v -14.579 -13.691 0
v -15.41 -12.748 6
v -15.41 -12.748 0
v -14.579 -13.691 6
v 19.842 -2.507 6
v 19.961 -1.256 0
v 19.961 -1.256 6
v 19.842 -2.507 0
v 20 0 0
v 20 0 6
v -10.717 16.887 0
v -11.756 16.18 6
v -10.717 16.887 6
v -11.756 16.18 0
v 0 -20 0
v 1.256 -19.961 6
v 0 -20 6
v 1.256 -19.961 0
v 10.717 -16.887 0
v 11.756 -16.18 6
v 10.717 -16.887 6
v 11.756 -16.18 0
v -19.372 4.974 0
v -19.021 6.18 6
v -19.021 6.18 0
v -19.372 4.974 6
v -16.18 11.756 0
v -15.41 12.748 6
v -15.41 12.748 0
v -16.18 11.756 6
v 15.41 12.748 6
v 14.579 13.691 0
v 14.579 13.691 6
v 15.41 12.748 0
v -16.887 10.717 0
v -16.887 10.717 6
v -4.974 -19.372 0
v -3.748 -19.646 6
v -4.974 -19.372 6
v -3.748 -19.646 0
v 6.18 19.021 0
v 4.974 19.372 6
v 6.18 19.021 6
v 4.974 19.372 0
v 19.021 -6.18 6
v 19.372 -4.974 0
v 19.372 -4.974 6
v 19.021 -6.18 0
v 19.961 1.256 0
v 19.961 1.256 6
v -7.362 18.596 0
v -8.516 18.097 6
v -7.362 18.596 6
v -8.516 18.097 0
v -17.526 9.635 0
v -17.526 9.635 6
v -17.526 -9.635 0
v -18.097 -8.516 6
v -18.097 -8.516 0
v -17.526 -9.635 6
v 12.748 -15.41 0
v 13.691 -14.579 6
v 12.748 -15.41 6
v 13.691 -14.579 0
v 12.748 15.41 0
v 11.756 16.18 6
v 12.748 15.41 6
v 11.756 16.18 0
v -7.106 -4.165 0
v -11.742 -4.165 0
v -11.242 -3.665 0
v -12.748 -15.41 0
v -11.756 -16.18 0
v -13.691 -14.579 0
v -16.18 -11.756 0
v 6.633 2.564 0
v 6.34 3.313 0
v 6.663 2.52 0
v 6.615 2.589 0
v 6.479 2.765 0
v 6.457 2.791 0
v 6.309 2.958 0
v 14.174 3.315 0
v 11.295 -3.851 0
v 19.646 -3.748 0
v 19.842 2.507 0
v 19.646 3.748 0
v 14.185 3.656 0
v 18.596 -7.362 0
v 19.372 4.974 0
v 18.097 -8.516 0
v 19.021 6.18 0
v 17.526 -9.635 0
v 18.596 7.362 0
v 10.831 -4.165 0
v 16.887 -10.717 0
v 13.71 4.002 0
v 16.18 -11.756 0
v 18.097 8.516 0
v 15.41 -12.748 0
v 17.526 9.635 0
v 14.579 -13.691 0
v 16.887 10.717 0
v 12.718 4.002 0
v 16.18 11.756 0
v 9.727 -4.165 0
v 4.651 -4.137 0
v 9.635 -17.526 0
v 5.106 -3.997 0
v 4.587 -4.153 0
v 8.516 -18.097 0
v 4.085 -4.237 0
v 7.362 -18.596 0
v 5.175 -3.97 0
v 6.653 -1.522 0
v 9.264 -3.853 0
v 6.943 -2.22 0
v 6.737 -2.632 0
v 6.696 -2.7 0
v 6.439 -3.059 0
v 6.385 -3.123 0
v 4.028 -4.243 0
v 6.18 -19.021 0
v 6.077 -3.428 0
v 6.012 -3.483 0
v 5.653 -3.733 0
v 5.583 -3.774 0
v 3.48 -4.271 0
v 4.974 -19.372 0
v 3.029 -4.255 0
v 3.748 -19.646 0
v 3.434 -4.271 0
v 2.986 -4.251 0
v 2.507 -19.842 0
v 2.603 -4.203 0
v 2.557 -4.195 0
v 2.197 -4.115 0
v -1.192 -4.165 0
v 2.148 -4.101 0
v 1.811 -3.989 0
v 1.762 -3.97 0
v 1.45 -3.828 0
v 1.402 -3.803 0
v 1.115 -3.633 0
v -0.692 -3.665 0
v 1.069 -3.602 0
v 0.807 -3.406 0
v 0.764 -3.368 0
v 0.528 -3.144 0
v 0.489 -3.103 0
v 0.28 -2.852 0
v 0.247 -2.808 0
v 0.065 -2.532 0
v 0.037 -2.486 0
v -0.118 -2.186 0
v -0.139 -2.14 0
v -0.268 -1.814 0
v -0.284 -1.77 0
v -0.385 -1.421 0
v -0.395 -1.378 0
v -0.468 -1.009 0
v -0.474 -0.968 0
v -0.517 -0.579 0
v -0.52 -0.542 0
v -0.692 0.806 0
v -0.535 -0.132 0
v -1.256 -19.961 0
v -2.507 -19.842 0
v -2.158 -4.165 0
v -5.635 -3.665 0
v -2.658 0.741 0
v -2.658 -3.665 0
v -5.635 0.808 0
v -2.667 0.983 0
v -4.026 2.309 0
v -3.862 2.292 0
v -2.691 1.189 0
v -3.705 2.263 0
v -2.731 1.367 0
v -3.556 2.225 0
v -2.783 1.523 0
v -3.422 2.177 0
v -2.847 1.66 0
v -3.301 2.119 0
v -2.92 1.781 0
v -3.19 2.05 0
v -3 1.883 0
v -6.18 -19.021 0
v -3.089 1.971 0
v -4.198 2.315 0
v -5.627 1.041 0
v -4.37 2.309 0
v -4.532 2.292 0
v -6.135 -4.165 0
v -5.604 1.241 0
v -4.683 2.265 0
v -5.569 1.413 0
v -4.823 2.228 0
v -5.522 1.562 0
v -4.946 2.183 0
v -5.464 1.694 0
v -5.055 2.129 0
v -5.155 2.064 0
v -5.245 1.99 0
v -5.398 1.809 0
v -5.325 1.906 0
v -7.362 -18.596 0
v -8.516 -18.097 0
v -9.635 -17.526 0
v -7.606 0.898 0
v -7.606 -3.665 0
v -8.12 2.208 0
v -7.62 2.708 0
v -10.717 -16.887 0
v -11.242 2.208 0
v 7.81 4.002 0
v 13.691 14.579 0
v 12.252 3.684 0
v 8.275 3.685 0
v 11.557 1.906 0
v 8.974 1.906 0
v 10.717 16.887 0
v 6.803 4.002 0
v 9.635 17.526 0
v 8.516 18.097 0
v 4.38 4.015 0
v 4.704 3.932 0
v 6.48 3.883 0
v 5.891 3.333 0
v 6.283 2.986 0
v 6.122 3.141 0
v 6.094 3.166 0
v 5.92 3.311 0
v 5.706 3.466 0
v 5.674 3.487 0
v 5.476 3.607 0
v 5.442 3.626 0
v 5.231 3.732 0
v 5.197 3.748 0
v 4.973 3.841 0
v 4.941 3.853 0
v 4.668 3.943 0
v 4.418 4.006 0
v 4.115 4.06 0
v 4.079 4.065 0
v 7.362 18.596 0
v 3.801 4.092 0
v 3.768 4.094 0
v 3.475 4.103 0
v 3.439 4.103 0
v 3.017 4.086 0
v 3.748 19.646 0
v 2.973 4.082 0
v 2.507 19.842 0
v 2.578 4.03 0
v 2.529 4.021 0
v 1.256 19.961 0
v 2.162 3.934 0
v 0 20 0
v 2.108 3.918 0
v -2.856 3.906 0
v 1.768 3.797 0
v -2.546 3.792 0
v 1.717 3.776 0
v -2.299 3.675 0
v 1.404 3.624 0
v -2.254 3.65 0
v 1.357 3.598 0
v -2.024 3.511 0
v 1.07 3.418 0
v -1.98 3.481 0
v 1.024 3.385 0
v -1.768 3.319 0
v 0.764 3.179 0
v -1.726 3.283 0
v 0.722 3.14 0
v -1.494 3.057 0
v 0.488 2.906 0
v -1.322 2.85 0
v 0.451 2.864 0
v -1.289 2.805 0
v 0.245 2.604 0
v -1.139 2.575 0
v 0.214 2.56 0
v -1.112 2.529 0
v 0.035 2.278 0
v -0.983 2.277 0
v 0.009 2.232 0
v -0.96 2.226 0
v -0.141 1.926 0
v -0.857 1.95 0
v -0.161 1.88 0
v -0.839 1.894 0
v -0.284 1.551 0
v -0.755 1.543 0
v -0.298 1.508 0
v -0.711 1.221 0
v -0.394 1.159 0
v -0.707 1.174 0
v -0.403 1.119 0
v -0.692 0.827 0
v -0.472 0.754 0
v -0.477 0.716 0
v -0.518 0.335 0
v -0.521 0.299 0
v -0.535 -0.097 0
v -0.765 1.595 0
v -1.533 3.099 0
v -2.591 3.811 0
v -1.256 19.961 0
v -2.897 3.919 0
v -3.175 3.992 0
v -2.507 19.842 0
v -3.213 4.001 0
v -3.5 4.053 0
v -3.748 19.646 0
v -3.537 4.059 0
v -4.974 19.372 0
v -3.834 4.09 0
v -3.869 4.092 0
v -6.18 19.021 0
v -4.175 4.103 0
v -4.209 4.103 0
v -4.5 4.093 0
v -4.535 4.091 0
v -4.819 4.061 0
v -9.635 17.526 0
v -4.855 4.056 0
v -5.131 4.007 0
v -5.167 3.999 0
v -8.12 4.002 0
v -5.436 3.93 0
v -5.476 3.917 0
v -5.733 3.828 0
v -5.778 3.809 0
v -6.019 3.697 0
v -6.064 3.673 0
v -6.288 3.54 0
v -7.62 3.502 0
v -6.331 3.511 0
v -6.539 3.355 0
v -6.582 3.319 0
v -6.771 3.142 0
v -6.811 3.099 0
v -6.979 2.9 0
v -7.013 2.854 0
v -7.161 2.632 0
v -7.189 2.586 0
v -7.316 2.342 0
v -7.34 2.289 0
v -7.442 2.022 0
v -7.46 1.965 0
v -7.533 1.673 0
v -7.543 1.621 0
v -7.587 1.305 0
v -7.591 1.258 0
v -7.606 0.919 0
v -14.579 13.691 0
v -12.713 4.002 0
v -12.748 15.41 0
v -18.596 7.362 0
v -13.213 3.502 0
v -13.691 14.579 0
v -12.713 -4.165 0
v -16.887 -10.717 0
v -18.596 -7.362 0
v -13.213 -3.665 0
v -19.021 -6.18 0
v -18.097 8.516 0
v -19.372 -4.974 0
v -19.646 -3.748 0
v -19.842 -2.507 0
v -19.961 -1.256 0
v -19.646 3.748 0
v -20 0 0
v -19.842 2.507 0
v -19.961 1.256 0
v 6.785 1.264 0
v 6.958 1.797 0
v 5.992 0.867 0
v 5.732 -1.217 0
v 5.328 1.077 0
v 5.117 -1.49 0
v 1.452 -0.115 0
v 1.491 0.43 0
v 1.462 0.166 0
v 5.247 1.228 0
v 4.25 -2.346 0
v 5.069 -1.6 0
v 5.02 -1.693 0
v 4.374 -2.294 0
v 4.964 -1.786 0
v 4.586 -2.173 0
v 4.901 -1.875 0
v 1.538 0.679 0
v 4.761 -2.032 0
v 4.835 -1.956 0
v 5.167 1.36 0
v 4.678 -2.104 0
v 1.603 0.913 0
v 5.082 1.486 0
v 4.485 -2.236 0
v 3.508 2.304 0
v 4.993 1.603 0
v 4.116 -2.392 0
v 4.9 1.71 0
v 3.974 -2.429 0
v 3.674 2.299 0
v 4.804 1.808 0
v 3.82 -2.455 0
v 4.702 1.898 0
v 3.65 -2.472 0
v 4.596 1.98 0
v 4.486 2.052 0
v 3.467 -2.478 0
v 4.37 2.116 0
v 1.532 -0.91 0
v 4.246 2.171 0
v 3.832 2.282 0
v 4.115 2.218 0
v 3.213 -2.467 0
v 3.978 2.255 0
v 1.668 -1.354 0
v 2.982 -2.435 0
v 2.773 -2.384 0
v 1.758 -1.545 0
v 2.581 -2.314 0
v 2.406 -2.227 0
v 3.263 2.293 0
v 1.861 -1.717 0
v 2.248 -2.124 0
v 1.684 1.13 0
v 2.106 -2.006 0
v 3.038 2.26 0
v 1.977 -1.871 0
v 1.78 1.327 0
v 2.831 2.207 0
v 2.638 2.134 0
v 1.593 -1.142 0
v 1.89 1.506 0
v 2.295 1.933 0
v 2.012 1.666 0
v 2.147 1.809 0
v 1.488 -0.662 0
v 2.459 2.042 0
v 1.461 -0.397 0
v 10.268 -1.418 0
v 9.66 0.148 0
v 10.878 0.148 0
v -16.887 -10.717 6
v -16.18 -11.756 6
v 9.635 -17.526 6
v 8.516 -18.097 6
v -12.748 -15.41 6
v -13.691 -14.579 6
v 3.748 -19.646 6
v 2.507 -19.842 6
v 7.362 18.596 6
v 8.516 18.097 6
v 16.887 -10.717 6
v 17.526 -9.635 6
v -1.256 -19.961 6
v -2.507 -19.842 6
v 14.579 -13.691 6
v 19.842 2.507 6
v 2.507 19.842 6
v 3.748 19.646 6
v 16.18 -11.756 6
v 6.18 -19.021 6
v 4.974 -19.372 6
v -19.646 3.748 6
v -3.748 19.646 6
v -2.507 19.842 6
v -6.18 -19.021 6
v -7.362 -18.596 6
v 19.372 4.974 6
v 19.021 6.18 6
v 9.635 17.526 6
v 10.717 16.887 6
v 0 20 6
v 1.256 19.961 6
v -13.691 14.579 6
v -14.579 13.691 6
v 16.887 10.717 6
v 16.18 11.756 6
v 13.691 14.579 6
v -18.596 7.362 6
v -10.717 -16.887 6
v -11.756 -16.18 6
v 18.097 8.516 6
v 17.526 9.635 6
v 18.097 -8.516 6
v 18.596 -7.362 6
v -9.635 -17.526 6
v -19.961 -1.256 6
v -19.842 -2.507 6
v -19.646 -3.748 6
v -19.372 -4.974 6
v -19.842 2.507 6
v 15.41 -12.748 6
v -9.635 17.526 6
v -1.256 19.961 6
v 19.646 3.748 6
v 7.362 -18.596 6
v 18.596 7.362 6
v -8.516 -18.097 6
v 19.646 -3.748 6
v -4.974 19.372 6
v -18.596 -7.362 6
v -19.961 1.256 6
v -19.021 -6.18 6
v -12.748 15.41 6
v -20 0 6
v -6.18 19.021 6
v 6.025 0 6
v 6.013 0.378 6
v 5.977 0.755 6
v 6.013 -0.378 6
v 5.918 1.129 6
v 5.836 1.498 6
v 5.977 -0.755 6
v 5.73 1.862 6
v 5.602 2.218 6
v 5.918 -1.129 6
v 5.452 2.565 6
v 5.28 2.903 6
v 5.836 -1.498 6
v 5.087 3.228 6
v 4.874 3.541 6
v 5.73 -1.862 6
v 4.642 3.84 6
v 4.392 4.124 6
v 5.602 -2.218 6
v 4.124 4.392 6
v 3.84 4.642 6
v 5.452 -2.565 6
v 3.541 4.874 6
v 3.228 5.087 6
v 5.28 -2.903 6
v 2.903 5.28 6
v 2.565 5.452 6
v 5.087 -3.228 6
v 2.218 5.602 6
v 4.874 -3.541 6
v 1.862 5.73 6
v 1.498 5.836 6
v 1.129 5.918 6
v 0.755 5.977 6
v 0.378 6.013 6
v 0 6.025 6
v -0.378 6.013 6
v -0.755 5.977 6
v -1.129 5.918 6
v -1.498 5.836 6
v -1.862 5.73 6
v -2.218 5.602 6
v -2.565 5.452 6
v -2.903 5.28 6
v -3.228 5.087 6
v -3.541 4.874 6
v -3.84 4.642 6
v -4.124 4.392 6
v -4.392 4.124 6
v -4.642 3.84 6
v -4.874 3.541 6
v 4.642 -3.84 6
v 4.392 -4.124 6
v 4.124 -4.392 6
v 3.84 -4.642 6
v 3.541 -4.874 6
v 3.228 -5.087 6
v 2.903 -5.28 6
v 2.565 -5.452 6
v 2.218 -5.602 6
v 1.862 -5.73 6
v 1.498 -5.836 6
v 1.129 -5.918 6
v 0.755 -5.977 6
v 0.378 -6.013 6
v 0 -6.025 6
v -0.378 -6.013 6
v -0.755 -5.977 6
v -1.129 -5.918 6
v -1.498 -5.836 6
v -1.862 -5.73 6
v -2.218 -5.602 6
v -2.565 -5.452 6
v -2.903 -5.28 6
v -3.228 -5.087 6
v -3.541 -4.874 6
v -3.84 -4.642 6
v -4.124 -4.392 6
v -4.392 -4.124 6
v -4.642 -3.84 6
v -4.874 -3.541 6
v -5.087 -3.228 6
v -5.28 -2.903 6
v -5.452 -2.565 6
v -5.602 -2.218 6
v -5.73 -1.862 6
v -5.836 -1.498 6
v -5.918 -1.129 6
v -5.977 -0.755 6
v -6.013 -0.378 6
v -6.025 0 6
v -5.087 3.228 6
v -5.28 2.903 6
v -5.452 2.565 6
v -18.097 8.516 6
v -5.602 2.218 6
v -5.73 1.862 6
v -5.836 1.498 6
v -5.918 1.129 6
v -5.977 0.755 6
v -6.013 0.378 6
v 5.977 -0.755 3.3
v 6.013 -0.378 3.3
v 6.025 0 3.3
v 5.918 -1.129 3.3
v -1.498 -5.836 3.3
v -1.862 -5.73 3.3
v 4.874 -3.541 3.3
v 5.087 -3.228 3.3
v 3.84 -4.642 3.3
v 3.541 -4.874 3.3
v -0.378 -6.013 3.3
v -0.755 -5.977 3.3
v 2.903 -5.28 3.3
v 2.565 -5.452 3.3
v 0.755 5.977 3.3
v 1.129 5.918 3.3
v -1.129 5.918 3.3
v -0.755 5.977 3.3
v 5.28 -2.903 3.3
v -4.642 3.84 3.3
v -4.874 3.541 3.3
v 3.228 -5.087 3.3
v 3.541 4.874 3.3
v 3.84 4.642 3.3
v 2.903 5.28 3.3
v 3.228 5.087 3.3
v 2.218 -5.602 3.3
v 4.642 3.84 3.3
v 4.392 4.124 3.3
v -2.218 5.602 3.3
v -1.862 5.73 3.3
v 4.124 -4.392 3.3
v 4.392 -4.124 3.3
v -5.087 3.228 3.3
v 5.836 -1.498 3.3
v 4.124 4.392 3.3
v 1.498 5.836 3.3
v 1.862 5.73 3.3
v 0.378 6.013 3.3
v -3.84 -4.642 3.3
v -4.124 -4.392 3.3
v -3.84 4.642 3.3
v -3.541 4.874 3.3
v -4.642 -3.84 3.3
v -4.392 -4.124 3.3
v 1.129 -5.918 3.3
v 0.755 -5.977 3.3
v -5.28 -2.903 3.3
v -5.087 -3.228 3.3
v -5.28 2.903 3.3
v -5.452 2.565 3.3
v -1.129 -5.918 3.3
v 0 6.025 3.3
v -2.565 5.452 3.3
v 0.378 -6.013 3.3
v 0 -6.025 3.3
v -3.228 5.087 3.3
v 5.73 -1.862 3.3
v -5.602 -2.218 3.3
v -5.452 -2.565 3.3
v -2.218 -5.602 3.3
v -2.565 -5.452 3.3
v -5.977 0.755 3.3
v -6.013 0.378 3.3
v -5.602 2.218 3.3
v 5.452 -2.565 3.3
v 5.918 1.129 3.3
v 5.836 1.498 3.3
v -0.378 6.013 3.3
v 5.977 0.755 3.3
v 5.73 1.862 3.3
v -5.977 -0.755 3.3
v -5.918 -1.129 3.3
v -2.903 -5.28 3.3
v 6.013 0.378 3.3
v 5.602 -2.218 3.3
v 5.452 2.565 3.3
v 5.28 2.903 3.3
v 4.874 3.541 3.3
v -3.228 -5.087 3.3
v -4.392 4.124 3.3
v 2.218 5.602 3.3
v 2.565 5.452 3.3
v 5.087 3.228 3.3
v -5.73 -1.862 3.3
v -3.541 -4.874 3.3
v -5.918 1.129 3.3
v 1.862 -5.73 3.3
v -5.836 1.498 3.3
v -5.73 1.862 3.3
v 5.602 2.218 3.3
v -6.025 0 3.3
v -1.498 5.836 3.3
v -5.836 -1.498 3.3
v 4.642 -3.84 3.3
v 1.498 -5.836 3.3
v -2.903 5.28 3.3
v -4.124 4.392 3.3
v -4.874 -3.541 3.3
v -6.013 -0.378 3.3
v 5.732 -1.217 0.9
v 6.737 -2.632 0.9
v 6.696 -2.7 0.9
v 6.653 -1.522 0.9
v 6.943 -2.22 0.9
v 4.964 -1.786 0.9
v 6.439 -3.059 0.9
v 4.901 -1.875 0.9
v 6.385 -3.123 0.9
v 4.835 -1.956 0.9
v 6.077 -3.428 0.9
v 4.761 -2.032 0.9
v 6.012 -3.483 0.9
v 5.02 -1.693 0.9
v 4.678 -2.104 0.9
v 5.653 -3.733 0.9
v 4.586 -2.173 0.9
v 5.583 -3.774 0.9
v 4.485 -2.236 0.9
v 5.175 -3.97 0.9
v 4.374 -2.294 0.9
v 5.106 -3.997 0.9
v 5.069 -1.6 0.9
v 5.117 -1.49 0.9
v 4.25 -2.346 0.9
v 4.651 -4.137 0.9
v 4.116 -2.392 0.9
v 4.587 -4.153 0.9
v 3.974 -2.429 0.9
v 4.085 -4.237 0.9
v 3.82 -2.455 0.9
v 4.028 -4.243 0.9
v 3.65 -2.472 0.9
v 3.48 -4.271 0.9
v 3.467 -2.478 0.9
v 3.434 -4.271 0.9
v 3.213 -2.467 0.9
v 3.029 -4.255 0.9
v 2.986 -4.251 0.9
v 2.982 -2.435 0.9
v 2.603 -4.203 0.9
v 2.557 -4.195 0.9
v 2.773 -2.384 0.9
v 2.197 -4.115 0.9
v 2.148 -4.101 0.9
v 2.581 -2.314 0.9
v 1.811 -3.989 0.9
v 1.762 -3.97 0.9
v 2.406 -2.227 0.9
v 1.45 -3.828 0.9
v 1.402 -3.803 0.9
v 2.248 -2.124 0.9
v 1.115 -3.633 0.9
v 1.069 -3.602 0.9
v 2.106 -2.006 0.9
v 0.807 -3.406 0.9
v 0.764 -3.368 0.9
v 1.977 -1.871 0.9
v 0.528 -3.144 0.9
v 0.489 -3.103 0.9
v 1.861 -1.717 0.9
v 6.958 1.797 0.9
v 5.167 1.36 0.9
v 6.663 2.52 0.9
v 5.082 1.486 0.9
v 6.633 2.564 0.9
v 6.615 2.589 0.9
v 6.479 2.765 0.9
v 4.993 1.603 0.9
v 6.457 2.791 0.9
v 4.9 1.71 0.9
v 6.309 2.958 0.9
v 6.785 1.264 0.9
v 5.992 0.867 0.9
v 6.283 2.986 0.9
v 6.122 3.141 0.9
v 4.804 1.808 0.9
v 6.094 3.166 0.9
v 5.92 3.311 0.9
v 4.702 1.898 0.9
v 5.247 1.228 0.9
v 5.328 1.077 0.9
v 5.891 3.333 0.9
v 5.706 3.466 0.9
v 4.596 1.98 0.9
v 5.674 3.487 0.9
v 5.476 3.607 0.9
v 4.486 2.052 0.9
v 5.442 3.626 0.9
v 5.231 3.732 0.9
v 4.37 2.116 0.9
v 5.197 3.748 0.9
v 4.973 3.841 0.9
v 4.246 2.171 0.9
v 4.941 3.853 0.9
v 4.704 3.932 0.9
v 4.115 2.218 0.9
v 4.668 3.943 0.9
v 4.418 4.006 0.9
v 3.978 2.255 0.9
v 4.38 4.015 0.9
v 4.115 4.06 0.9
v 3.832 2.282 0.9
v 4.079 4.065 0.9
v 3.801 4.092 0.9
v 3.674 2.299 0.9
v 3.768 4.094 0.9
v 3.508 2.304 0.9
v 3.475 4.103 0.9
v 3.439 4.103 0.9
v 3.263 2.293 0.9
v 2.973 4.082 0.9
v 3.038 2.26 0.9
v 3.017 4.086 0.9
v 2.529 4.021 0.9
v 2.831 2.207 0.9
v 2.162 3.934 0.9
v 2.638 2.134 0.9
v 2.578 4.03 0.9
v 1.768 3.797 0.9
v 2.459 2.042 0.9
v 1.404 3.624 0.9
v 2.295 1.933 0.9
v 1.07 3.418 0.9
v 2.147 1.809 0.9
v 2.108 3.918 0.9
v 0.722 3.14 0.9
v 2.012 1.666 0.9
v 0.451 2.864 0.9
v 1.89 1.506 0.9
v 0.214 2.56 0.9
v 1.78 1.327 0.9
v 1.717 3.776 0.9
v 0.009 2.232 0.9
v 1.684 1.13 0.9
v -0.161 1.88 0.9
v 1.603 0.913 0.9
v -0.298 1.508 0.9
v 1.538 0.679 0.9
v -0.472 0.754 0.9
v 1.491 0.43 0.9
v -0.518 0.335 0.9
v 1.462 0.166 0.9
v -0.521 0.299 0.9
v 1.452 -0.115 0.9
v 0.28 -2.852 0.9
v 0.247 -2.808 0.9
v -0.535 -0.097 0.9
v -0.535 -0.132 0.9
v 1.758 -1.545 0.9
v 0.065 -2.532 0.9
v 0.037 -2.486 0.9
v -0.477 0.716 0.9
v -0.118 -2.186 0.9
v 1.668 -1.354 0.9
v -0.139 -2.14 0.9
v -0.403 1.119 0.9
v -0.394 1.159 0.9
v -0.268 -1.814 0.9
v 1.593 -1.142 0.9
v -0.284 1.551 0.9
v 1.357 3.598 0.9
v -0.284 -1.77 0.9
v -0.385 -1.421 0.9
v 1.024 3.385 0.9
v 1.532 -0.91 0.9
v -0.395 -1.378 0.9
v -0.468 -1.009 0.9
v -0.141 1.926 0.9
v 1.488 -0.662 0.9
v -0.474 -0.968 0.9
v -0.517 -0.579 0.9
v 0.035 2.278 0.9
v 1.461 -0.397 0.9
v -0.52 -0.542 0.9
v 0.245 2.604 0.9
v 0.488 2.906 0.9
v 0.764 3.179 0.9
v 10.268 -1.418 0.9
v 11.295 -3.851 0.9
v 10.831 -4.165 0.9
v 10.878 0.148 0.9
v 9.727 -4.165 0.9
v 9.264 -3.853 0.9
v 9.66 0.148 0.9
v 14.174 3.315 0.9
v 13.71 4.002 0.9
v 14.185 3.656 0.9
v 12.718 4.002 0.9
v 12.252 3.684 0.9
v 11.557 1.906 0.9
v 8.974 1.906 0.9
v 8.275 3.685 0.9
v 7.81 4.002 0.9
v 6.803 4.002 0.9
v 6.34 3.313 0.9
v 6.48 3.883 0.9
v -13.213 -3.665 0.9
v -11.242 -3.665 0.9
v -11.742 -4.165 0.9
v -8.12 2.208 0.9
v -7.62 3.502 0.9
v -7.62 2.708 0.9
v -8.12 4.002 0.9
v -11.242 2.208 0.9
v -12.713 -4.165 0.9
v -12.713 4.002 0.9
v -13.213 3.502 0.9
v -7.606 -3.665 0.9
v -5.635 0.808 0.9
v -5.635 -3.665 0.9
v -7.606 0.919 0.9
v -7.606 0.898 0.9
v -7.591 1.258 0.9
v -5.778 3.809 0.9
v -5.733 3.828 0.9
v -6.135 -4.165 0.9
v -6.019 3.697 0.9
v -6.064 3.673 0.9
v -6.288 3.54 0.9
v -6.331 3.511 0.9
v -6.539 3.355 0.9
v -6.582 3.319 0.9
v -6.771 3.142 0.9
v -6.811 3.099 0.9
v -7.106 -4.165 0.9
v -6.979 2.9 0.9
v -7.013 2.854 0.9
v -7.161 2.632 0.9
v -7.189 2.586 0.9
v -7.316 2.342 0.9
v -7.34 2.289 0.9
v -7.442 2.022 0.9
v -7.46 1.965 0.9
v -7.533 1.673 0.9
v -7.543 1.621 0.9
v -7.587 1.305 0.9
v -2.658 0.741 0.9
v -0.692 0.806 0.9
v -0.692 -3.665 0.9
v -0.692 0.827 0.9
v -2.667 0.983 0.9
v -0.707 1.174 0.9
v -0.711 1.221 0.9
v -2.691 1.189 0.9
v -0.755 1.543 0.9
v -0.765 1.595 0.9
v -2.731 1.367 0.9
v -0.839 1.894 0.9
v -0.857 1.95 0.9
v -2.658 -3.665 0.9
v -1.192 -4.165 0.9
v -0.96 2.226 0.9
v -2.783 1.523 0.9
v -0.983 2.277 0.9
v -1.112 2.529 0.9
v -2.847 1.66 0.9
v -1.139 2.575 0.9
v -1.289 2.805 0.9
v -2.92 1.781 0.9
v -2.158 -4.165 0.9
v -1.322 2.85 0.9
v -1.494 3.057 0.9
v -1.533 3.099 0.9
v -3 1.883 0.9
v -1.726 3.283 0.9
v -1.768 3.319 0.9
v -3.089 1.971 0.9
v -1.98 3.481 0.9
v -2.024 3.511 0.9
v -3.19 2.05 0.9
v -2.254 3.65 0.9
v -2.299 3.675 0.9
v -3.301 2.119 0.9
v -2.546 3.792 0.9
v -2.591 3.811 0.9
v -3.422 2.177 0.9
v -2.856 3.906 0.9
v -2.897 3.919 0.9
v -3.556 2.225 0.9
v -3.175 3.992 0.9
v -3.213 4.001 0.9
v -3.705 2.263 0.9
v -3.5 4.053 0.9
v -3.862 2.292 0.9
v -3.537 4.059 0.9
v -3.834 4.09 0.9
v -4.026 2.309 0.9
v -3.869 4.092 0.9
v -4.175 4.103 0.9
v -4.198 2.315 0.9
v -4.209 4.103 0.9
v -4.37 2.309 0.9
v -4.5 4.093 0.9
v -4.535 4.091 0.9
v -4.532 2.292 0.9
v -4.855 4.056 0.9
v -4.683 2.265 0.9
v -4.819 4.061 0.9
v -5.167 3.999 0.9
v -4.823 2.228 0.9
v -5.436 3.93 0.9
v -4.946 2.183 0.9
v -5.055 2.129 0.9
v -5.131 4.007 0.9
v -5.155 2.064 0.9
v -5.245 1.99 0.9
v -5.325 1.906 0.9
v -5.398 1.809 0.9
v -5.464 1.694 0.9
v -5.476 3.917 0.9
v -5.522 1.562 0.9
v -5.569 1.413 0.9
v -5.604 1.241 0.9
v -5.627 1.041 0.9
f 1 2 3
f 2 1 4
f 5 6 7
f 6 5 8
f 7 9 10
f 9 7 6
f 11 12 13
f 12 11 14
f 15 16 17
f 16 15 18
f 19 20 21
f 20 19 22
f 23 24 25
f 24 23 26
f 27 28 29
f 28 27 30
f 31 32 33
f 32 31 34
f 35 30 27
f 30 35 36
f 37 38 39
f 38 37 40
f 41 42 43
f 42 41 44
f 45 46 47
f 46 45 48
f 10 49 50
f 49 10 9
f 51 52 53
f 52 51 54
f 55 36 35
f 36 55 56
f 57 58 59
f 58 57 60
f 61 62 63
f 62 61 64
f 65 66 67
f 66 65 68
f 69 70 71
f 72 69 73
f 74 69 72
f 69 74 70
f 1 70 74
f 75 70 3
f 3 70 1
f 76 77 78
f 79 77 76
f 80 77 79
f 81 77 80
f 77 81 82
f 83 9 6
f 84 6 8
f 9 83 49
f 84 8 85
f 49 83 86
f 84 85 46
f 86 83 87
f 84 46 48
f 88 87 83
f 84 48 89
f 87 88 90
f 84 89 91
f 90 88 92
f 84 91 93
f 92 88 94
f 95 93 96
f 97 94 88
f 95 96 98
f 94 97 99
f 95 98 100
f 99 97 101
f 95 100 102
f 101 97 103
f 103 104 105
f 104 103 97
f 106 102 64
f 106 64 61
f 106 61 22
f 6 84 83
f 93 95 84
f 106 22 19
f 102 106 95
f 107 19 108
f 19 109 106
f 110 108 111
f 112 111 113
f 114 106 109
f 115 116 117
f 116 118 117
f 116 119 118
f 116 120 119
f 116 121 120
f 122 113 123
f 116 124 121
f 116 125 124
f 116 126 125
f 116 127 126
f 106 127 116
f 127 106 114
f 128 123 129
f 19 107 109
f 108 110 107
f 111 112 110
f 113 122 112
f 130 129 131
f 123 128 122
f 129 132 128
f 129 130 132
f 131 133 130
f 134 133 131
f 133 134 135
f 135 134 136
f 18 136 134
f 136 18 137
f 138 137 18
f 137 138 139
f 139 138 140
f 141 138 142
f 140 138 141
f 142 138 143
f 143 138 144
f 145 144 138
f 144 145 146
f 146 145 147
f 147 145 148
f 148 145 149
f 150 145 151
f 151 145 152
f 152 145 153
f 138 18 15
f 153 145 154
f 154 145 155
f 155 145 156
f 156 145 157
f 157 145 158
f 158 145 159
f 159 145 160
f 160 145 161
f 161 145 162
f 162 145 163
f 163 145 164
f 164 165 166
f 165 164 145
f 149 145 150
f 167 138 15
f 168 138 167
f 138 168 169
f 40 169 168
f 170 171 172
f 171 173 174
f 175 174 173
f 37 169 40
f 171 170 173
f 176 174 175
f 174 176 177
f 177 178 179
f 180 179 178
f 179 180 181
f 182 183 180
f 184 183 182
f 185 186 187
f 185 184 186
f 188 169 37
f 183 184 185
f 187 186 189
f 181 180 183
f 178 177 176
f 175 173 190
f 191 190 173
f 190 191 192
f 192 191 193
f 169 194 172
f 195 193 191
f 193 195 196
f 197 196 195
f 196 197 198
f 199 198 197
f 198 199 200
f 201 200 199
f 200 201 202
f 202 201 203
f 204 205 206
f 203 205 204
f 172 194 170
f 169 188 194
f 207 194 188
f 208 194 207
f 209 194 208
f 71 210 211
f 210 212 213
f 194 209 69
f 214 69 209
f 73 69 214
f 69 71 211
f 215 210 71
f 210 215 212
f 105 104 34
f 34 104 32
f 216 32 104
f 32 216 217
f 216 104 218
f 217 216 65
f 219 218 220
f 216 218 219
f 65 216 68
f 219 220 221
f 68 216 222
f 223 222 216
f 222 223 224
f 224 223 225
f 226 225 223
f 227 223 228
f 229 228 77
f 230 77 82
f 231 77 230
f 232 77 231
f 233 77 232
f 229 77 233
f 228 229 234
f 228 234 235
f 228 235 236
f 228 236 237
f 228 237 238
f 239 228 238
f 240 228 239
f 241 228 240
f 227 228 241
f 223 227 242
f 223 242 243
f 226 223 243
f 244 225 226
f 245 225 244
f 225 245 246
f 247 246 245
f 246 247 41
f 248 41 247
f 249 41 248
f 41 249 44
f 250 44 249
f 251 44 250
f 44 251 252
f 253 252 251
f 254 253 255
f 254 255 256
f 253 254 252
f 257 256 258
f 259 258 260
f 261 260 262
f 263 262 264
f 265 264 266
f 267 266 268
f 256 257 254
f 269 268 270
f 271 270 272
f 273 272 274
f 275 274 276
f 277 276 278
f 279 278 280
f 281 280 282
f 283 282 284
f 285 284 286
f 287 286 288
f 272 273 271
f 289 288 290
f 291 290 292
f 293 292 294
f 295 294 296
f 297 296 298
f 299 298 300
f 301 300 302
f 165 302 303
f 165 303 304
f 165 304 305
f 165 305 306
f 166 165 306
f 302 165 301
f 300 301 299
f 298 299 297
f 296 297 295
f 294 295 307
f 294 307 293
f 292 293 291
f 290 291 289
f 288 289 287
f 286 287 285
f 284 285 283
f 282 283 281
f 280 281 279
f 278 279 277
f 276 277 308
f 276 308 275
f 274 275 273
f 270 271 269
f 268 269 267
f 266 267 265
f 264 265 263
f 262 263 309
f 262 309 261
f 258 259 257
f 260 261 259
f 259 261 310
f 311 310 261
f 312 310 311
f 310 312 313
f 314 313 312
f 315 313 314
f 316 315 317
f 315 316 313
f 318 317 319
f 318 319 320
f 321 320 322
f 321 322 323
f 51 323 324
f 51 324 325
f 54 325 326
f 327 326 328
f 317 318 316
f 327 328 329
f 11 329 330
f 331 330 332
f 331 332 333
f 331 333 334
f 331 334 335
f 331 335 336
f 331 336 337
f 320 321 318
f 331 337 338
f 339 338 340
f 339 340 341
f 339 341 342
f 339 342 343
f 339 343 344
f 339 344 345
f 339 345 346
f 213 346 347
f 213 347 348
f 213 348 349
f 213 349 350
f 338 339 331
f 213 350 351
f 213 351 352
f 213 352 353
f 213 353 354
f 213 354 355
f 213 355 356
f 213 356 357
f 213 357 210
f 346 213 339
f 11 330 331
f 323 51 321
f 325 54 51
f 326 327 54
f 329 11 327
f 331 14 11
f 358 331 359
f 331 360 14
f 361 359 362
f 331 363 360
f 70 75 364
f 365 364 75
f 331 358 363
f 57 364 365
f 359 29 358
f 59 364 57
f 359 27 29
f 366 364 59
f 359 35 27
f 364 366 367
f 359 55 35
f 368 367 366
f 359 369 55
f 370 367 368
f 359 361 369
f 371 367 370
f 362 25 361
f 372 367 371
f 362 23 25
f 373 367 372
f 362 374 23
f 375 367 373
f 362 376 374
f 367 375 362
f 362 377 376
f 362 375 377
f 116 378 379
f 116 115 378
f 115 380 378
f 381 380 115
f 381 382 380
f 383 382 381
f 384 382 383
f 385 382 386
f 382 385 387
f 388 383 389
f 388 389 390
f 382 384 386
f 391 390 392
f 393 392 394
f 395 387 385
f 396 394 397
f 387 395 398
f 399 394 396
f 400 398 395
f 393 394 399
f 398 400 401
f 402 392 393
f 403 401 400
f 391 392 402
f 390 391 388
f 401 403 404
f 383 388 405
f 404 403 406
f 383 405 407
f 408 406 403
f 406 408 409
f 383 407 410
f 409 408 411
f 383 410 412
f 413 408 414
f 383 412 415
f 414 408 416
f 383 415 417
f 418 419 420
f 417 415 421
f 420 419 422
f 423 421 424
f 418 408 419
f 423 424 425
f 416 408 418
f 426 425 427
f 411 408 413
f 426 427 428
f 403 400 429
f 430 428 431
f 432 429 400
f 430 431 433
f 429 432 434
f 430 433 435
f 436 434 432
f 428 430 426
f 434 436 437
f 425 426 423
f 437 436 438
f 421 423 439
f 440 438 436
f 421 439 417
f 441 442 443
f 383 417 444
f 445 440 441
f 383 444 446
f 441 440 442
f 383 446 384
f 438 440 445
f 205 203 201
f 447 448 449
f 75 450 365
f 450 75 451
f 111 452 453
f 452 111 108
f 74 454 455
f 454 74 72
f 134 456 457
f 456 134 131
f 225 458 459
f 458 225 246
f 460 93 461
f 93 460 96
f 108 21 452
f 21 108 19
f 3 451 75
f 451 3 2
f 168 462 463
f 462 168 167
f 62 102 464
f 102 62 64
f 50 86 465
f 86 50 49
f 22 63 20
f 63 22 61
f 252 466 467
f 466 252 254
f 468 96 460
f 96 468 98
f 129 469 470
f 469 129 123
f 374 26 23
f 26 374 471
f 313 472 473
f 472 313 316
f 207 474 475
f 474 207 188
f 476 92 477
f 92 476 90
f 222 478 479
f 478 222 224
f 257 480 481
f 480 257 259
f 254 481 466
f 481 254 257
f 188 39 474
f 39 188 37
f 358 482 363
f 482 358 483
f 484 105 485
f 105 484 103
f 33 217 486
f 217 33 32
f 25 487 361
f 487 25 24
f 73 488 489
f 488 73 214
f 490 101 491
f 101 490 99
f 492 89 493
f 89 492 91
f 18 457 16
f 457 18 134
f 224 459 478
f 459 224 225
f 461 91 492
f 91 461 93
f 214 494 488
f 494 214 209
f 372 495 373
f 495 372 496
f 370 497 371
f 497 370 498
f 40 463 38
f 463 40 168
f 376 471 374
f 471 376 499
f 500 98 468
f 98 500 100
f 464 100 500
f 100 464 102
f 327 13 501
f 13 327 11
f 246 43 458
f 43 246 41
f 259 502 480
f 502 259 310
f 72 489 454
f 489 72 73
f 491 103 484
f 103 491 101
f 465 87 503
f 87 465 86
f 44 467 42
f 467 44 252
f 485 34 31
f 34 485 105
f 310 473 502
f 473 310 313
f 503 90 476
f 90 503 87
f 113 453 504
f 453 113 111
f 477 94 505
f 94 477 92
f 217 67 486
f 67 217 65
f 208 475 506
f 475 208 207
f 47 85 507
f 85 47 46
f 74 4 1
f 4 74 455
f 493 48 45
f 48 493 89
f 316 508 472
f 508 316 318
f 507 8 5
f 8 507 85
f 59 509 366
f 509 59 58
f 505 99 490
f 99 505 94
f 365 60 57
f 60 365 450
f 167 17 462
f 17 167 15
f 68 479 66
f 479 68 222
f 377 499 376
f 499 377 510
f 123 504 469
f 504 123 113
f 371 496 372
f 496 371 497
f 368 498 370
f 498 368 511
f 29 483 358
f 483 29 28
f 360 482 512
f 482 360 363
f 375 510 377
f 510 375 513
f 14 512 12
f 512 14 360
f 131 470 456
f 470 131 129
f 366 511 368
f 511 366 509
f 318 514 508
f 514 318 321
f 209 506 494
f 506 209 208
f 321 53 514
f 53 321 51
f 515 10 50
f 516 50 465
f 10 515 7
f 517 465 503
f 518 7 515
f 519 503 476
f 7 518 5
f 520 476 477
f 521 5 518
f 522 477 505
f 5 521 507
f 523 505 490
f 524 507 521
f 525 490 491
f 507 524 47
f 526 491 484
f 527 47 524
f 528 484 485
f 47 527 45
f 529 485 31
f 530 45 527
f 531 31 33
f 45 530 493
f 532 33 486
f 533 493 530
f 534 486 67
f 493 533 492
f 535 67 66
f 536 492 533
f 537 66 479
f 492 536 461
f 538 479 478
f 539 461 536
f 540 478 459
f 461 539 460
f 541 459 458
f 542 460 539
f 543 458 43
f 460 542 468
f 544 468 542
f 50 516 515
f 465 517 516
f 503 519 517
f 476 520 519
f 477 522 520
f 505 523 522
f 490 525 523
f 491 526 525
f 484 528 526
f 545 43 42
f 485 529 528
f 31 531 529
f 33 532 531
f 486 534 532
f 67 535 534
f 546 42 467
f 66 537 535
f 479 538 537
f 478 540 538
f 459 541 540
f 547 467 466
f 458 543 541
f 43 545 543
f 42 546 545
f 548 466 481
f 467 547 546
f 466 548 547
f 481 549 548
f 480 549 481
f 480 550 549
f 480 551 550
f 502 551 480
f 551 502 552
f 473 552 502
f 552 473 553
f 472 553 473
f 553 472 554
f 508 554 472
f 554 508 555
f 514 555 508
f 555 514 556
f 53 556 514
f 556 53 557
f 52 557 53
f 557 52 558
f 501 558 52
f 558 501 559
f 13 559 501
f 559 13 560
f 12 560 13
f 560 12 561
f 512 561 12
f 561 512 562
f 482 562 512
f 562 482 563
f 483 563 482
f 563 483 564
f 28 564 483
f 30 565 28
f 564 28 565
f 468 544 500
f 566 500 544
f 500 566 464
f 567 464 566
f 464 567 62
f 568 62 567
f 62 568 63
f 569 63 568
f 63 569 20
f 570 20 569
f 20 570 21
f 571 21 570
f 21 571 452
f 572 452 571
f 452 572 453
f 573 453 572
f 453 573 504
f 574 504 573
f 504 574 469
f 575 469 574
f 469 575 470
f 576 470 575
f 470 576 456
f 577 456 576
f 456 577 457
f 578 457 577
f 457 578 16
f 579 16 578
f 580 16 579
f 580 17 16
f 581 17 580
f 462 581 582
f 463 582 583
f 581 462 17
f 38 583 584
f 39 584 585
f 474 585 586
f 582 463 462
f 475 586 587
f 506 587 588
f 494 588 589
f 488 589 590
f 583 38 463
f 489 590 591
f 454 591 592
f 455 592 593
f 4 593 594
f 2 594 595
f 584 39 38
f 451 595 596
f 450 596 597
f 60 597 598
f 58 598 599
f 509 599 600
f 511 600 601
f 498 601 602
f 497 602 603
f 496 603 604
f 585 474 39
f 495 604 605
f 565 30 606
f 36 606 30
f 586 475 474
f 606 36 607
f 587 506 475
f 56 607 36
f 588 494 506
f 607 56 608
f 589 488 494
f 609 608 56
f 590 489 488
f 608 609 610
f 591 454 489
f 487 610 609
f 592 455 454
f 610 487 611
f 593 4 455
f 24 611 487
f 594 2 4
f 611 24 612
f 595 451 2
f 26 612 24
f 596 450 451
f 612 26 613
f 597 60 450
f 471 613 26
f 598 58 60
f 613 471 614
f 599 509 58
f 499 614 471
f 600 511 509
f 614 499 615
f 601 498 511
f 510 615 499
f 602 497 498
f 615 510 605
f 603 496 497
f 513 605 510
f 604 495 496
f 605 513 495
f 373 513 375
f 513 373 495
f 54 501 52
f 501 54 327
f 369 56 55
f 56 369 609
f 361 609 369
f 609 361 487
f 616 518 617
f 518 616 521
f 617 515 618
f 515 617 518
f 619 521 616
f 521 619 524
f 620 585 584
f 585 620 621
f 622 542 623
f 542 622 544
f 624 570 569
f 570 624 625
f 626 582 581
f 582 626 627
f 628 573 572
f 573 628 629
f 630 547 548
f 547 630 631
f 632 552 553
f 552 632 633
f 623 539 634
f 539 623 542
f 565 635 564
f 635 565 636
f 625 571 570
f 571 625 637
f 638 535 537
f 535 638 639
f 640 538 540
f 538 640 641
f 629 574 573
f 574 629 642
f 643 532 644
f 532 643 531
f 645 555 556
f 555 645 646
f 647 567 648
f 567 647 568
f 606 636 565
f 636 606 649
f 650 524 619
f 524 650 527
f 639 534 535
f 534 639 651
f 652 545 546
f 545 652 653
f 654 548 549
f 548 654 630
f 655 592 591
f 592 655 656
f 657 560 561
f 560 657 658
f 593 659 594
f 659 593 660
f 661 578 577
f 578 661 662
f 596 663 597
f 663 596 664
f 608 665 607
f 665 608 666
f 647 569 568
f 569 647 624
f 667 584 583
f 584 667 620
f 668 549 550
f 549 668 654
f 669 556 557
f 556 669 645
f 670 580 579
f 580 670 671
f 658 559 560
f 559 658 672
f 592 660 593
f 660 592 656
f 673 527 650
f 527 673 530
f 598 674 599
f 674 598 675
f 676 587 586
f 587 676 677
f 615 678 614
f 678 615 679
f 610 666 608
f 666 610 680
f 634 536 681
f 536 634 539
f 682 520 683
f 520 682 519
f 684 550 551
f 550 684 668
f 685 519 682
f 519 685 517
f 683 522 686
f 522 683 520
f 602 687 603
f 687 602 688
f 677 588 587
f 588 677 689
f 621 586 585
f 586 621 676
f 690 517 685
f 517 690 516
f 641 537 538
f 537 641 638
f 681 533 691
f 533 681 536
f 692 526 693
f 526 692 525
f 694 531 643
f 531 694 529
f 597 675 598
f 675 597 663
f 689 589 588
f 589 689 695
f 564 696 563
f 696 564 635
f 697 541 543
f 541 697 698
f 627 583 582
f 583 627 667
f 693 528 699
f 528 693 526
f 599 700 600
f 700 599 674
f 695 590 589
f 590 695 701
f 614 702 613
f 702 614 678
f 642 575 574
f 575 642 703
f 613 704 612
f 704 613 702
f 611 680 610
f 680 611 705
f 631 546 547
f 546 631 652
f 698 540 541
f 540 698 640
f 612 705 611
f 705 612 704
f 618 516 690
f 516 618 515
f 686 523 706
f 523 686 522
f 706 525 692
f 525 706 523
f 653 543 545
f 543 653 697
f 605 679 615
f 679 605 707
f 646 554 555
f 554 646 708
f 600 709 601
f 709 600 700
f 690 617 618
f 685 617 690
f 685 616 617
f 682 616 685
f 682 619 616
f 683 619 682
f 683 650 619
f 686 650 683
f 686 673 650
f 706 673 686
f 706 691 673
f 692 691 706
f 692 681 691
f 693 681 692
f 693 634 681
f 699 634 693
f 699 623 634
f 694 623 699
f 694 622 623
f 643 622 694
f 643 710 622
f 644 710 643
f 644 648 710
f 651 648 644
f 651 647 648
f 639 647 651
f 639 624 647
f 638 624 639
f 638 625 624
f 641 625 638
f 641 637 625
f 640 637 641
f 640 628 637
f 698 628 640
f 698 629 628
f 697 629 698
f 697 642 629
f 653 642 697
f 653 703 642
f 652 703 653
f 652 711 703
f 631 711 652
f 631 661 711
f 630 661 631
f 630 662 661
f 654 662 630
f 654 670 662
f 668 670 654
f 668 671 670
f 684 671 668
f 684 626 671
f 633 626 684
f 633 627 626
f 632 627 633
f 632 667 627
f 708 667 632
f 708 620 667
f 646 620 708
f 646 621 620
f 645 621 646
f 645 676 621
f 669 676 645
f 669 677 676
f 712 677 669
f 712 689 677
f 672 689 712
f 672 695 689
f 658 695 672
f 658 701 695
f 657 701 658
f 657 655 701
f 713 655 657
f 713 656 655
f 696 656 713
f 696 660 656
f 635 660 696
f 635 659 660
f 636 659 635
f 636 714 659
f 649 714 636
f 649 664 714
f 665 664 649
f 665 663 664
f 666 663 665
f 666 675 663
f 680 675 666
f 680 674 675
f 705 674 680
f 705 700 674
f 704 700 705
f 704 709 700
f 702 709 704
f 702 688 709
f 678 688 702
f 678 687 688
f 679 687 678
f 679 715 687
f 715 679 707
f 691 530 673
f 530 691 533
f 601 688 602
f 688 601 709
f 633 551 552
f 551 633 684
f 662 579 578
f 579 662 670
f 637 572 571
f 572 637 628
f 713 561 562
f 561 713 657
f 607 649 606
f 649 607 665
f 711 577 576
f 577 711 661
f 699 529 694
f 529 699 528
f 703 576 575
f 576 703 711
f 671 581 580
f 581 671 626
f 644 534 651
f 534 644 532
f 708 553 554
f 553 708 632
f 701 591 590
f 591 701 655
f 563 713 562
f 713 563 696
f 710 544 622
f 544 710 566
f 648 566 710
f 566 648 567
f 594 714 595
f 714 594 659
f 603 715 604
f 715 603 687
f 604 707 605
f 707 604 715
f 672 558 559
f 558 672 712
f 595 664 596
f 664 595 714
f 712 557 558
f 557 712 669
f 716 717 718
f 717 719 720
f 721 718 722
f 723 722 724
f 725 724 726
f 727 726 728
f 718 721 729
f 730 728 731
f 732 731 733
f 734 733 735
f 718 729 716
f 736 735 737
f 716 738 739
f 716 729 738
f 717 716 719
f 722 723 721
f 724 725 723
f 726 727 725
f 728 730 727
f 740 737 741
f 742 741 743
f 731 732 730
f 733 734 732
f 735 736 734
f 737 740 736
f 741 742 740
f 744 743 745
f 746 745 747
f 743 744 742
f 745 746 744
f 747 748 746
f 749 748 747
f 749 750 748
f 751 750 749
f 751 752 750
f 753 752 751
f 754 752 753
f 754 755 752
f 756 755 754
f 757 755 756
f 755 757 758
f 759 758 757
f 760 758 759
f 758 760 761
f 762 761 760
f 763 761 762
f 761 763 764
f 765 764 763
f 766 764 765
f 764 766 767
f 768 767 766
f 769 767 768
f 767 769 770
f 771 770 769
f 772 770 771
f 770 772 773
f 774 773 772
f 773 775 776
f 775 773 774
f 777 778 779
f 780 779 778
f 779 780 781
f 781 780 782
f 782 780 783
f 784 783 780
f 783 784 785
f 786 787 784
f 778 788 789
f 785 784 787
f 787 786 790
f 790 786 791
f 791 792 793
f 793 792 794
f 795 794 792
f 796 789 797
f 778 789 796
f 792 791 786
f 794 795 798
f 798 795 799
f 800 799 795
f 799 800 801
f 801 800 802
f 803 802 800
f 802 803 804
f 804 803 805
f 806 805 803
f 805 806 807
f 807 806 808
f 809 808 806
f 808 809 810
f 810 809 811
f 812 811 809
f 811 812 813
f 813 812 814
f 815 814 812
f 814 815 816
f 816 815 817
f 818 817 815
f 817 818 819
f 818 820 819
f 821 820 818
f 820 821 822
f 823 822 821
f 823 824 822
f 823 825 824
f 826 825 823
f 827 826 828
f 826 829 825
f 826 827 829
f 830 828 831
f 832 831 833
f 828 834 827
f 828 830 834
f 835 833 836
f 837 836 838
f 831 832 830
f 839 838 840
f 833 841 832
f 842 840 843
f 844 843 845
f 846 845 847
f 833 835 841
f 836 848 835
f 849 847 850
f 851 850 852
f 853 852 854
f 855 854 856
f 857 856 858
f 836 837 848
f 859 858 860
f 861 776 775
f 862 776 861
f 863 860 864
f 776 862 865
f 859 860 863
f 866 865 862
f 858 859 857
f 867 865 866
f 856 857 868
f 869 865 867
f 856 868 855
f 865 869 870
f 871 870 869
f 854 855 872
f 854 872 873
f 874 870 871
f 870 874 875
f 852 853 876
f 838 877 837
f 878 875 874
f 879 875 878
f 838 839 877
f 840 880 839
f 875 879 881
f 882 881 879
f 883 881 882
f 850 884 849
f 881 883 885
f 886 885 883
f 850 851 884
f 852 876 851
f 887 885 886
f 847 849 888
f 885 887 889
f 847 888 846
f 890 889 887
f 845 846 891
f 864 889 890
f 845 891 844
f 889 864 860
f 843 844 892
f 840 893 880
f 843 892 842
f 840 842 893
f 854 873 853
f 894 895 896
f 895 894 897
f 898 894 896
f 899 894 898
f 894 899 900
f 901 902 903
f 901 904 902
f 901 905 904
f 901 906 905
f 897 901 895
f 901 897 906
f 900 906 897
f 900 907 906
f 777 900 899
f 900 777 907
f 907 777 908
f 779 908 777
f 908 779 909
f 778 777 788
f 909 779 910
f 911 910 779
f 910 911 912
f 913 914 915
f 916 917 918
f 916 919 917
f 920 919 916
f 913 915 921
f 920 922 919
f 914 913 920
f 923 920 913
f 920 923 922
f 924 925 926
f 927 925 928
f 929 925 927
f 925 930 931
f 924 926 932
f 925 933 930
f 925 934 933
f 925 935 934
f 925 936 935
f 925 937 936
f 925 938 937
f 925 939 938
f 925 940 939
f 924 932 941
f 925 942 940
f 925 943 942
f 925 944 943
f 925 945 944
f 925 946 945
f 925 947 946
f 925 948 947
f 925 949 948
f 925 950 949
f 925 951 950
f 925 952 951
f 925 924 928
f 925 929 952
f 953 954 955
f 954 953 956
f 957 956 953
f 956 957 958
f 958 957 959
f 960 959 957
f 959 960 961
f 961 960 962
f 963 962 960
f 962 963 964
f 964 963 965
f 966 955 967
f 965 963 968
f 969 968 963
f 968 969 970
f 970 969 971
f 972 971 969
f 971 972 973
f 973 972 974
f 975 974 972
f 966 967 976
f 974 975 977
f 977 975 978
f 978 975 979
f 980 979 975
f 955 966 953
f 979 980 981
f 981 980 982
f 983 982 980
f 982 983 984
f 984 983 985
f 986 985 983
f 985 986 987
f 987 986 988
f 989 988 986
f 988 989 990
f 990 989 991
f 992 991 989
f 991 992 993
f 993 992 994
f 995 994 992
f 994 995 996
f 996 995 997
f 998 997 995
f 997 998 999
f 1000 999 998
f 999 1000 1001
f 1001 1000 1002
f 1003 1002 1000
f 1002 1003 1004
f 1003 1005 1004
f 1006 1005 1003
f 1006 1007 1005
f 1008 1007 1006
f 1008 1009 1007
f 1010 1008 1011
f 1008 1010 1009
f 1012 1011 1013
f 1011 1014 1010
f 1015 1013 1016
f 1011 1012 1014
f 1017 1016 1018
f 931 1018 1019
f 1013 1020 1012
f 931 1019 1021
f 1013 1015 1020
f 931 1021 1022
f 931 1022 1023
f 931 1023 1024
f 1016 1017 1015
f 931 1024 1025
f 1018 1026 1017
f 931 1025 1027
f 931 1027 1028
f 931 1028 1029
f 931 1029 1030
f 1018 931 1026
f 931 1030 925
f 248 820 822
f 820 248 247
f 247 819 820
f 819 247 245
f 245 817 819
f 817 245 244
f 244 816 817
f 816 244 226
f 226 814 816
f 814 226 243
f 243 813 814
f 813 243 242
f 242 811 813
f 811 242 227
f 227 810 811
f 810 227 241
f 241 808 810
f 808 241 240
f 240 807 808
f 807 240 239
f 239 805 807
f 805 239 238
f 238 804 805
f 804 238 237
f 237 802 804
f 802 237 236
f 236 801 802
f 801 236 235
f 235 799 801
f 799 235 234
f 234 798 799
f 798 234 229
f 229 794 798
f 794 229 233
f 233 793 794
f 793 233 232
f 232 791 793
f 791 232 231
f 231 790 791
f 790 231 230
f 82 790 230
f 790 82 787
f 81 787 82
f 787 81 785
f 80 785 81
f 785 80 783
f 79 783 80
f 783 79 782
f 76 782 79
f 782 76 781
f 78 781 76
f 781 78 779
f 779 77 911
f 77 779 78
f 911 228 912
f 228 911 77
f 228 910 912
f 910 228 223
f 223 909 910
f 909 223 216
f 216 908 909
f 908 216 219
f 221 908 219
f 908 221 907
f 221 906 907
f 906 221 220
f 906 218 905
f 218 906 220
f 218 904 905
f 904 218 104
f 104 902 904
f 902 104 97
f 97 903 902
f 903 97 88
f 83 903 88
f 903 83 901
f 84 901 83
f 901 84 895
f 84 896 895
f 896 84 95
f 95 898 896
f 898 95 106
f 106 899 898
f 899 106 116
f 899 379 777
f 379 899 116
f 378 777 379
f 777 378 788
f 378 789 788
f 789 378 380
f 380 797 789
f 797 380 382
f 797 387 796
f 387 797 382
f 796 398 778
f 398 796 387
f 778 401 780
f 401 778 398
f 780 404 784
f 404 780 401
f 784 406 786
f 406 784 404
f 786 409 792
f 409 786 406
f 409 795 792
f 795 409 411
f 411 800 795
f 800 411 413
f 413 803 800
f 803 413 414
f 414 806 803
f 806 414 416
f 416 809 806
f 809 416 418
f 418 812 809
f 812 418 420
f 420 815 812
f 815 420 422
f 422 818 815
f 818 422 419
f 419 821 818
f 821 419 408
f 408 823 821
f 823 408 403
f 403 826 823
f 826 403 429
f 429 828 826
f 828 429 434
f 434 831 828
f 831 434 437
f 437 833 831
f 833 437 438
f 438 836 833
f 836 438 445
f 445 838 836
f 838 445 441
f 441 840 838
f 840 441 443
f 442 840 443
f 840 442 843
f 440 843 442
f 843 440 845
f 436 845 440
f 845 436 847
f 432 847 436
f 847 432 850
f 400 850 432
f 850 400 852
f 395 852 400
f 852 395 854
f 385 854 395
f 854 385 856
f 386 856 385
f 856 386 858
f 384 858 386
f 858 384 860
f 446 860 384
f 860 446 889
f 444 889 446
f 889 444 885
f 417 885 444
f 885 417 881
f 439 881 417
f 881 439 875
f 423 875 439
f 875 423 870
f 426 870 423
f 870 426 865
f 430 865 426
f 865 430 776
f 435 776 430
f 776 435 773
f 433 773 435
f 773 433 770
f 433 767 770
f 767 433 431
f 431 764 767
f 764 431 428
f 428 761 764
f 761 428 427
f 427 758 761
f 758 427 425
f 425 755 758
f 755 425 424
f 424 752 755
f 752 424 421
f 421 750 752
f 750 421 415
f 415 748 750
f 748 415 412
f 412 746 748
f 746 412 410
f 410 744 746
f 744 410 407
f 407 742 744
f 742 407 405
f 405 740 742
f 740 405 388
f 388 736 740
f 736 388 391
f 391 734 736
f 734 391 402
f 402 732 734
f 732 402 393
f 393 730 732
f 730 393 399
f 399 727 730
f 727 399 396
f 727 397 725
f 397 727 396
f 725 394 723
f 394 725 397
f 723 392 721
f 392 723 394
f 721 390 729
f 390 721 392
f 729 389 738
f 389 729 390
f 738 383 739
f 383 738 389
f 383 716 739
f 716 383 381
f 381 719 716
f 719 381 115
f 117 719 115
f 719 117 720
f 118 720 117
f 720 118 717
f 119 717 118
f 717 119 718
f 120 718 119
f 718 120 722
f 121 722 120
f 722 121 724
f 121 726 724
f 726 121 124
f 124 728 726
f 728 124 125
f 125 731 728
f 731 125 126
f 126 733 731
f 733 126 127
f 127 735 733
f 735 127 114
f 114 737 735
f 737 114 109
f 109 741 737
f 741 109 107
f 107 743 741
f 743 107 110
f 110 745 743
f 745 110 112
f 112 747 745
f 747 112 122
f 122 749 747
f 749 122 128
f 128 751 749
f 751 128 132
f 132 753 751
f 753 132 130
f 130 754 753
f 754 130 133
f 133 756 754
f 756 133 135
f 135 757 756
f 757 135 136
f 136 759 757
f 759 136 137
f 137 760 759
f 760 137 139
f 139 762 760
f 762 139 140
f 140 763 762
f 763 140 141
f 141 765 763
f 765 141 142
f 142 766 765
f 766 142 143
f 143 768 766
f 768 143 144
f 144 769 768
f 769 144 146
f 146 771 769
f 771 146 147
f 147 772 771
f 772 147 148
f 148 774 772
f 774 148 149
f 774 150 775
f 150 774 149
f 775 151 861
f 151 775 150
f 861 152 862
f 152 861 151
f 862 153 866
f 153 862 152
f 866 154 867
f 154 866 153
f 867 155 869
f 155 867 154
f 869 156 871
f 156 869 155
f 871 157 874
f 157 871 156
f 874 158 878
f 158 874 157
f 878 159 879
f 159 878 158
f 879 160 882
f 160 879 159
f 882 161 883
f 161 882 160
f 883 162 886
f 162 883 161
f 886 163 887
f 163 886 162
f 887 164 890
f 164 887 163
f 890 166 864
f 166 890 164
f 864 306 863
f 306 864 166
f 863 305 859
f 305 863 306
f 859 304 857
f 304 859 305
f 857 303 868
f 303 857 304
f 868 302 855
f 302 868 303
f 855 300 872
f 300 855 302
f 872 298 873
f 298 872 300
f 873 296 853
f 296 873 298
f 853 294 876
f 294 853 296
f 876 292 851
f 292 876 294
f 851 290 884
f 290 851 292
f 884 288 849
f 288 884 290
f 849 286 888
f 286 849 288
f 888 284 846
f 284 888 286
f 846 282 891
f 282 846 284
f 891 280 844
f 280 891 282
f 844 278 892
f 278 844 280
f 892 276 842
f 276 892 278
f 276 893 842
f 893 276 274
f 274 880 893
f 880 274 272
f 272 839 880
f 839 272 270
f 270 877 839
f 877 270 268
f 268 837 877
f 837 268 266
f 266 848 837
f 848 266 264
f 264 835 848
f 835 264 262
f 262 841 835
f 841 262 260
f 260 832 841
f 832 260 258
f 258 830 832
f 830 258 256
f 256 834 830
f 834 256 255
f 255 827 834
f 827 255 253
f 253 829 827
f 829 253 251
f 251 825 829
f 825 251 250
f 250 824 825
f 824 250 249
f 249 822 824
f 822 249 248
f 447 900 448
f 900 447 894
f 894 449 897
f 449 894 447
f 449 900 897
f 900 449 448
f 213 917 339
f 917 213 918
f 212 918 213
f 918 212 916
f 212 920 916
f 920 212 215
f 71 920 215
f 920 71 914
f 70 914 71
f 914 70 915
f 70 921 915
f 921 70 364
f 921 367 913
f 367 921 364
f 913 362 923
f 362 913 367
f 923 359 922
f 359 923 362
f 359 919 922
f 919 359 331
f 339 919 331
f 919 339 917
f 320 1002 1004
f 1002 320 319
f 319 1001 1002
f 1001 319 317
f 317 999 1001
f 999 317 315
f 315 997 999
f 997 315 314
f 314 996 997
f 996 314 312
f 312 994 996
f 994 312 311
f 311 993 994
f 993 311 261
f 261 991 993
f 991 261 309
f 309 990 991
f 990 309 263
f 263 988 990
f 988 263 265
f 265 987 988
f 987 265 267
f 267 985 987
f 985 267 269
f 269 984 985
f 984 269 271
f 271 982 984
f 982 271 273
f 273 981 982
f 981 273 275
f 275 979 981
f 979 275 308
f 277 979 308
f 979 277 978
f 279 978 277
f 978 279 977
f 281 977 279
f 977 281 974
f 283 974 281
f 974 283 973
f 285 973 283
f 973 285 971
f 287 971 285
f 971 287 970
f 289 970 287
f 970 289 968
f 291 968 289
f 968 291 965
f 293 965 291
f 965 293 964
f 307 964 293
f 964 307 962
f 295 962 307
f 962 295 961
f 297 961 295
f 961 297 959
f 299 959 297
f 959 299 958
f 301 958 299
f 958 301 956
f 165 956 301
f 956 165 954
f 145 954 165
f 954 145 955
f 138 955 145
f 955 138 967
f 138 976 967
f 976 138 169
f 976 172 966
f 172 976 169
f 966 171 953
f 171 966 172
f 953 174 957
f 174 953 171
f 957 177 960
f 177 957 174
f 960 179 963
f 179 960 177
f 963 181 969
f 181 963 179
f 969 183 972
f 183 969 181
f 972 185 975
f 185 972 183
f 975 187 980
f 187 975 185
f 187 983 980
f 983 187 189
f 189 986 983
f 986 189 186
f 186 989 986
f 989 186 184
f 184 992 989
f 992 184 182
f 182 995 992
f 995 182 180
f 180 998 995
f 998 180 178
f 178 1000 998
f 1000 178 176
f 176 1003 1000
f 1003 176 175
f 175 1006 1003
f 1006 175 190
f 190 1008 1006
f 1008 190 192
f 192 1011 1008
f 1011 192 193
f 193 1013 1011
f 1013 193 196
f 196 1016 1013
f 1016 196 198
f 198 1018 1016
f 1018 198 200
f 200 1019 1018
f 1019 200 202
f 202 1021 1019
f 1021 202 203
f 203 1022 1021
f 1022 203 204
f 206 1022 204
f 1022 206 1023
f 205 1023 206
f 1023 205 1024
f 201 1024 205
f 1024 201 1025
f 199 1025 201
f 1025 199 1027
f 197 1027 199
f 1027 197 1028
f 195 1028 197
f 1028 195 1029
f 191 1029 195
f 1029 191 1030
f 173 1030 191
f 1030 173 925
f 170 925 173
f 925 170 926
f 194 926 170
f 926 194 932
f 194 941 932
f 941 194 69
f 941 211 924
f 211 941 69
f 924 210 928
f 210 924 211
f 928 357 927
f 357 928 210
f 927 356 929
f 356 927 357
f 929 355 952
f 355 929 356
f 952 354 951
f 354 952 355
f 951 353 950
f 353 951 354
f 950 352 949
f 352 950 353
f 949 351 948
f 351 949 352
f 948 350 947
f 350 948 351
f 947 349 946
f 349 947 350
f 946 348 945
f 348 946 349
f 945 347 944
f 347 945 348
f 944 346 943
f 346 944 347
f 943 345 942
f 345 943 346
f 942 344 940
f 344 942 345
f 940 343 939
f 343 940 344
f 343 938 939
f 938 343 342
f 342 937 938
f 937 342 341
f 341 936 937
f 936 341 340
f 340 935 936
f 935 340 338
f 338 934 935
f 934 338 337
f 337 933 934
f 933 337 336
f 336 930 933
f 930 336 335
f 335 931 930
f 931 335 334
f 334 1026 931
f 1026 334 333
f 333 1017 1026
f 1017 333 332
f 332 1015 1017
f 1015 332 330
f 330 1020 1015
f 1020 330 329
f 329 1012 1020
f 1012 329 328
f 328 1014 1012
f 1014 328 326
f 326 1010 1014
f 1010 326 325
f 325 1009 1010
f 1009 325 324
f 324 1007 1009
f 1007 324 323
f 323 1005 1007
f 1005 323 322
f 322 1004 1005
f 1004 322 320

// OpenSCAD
// Customizable Name Magnet Disk
// Parameters
// names = ["KEIFFER",
// ]; // List of names to create disks for
names = ["LUCA"]; // List of names to create disks for

disk_diameter = 40; // Diameter of the main disk in mm
disk_height = 6;    // Height of the disk in mm
magnet_diameter = 12; // Diameter of the magnet hole
magnet_depth = 2.75;  // Depth of the magnet hole
tolerance = 0.05;    // Tolerance for the magnet hole (both diameter and depth)
text_depth = 1;    // Depth of the name engraving
base_font_size = 7.5;    // Base size of the text for normal names
text_thickness = 0.5; // How bold to make the text

// Function to calculate font size based on name length
function get_font_size(name) = 
   name == "LINCOLN" || name == "ANTHONY" || name == "EVERETT" || name == "KEIFFER"  || name == "SHERALI" || name == "TRYSTAN"  ? base_font_size * .75 : base_font_size;

// Spacing parameters for grid layout
spacing = disk_diameter + 2; // Space between disks
grid_columns = 4; // Number of columns in the grid

// Main module for a single magnet disk
module magnet_disk(name) {
    rotate([180, 0, 0]) // Flip the disk upside down
    translate([0, 0, -disk_height]) // Move back to the build plate
    difference() {
        // Main disk body
        cylinder(h=disk_height, d=disk_diameter, $fn=100);
        
        // Magnet hole on the bottom with tolerance
        translate([0, 0, -0.1])
            cylinder(h=magnet_depth + tolerance, 
                    d=magnet_diameter + tolerance, 
                    $fn=100);
        
        // Name engraving on top
        translate([0, 0, disk_height - text_depth + 0.1])
            linear_extrude(height=text_depth + 0.1)
                offset(r=text_thickness)
                    text(name, 
                         size=get_font_size(name),
                         halign="center",
                         valign="center");
    }
}

// Module to create grid of disks
module disk_grid() {
    for (i = [0:len(names)-1]) {
        // Calculate row and column position
        row = floor(i / grid_columns);
        col = i % grid_columns;
        
        // Position disk in grid
        translate([col * spacing, row * spacing, 0])
            magnet_disk(names[i]);
    }
}

// Create the grid of disks
disk_grid(); 
